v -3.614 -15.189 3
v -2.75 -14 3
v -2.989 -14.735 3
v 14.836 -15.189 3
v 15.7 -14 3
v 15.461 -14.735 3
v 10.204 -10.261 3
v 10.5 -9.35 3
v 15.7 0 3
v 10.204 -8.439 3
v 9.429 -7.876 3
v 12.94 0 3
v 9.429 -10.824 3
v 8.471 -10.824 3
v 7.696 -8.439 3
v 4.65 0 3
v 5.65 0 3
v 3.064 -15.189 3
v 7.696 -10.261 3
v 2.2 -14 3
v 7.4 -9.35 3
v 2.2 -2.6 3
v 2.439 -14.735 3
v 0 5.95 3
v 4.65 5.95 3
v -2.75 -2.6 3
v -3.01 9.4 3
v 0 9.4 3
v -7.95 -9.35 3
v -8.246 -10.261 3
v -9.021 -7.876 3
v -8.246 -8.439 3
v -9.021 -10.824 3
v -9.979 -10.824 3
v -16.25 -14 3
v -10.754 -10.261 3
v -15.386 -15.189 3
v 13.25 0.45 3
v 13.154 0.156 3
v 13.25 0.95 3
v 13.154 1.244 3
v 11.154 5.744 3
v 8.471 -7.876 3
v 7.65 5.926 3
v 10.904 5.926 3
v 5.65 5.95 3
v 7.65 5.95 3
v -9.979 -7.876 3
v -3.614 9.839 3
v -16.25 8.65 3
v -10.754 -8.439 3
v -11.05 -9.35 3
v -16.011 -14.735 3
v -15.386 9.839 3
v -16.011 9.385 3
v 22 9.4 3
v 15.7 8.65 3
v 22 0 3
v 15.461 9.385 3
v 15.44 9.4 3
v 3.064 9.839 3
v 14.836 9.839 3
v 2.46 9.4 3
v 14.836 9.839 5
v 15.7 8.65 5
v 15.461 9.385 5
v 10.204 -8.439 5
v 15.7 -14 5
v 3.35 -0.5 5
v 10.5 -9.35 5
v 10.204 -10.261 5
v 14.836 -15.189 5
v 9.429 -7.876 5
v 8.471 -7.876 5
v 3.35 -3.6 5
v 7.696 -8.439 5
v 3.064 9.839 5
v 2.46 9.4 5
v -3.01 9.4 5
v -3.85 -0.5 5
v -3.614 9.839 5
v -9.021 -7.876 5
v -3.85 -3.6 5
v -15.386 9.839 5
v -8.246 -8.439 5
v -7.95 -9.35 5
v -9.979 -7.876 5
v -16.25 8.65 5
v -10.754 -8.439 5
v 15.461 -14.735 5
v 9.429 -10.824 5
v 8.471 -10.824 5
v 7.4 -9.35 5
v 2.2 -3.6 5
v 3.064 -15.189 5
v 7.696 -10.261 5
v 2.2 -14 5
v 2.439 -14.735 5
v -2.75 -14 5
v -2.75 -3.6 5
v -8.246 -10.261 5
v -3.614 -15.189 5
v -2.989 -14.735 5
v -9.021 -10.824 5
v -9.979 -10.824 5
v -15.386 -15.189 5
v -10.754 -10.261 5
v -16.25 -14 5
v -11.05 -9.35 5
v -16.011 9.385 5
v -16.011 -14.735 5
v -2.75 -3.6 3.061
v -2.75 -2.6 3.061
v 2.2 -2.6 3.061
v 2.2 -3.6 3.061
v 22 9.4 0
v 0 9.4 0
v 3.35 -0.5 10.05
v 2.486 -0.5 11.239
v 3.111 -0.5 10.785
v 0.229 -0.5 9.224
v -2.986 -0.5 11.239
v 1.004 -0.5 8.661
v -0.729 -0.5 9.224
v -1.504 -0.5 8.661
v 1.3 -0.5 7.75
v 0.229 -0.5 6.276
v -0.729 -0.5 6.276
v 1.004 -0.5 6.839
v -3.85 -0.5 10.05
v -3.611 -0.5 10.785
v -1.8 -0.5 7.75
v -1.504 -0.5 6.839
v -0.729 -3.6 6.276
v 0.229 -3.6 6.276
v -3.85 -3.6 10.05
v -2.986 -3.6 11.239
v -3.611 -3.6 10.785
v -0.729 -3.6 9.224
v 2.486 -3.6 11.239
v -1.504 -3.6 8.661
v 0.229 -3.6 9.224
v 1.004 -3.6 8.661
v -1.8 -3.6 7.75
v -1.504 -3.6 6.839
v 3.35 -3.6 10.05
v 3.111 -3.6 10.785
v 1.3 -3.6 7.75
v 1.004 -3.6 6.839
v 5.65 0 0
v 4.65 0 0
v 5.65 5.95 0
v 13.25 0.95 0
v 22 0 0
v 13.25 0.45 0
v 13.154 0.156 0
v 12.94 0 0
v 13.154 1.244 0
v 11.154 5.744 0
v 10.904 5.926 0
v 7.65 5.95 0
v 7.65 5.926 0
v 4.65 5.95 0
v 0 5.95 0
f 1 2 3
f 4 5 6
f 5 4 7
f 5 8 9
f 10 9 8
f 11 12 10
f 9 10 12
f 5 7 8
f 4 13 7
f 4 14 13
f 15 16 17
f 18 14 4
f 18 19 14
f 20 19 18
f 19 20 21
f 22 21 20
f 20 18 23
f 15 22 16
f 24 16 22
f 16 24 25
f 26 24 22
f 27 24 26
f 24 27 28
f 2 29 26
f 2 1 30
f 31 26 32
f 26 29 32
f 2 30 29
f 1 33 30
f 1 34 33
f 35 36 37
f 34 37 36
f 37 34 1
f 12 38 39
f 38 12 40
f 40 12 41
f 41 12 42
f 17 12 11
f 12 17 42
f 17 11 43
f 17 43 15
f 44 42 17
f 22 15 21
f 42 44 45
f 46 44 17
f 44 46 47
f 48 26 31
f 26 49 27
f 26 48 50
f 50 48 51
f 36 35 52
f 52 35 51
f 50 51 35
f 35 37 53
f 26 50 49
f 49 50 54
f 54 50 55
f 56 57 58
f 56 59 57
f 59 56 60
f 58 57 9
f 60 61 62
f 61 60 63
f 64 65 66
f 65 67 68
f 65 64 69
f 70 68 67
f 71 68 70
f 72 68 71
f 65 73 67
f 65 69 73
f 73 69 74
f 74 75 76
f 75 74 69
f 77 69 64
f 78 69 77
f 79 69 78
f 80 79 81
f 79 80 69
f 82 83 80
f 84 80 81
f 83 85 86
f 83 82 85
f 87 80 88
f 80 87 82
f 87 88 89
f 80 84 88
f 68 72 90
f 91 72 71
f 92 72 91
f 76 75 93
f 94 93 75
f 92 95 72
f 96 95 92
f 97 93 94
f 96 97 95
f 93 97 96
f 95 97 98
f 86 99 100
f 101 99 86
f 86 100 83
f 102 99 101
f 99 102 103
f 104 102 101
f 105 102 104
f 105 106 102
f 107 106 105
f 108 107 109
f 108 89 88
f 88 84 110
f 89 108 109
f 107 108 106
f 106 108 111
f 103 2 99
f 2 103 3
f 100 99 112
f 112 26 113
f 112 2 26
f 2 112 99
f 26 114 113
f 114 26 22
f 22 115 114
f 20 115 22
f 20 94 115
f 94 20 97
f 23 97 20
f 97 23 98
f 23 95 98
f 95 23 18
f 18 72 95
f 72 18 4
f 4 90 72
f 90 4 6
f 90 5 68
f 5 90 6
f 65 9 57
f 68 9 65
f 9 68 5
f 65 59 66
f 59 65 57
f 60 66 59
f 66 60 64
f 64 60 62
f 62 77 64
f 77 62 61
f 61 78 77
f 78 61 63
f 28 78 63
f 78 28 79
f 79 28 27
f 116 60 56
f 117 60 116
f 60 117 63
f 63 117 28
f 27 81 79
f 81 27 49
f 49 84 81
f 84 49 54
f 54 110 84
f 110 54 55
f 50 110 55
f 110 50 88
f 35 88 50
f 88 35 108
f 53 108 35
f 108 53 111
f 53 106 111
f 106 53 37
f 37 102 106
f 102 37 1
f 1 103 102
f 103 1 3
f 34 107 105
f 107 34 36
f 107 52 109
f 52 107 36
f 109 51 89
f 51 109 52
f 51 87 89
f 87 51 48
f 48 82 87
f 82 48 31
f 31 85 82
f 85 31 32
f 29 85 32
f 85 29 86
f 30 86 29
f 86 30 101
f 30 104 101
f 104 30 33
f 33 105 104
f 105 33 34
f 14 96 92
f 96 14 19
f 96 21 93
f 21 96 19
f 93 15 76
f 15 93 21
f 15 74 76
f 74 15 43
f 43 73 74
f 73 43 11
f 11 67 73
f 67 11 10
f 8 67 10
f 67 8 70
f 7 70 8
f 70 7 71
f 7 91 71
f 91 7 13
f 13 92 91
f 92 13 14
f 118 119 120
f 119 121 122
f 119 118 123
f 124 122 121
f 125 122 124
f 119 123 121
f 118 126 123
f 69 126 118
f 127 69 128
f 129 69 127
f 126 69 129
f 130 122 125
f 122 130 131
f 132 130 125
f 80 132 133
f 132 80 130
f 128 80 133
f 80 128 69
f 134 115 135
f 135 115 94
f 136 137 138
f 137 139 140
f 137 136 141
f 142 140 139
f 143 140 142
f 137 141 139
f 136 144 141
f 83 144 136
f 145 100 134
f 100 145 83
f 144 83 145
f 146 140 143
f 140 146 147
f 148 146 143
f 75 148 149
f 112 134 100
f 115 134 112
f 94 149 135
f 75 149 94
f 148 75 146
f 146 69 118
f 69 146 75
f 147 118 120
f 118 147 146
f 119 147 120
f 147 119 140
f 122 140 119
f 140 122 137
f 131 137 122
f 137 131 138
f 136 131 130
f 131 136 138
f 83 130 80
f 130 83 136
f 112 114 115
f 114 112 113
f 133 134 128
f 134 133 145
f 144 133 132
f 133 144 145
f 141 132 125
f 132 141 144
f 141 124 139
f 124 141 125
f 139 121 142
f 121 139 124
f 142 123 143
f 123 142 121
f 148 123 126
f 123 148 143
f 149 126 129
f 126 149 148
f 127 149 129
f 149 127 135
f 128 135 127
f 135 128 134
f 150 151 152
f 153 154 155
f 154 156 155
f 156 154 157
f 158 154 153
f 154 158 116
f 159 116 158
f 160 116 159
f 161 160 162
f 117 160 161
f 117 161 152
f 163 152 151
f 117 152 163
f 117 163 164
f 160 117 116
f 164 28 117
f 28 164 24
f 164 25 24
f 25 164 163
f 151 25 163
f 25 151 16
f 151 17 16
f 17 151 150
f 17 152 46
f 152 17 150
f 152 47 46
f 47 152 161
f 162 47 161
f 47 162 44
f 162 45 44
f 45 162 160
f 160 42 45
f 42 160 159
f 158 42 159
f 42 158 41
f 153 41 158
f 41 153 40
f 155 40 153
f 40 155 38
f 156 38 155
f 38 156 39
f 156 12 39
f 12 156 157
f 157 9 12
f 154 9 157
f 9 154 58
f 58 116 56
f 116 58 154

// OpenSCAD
$fn = 10;

module flance() {
difference(){
minkowski(){
    square([13.5 - 2.5,23.9 - 2.5/2]);
    circle(d=2.5);
}

translate([(13.5-2.5)/2, 3.1 + 3.1/2,0]) circle(d = 3.1);
}
}

module flance_lower_connection() {
linear_extrude(height=3.1) union() {
    difference() {  
        minkowski() {
            square([7.2-2.5, 8.3 - 2.5]);
            circle(d=2.5);
        }

        translate([ (7.2-2.5)/2, (8.3 - 2.5/2) -3.1/2 -2,0]) circle(d=3.1);
        }
    }
}


module bottom_connection() {
linear_extrude(height=2)
union() {
flance();
translate([13.5+6.2 - 2.5/2, 0, 0]) flance();
translate([11.5, 23.9 - 12 -0.5, 0]) square([6.2, 12]);
}
translate([12.4, 23.9 - 10.4 ,2.5/2]) rotate([90,0,0]) flance_lower_connection();
}


module half_lower_slide() {
translate([9.4/2+1.6, 0.5,0])
minkowski(){
hull() {
square([6.5,0.5]);
translate([0,5-0.5,0]) square([4.5,0.5]);;
}
circle(d=1);
}
translate([9.4/2+1.,0,0]) square([2,6]);

square([9.4/2,6]);
}

linear_extrude(height=3) difference() {
square([22,9.4]);
translate([-0.05,-0.05,0]) half_lower_slide();
}


translate([-30/2,-14,3])bottom_connection();
